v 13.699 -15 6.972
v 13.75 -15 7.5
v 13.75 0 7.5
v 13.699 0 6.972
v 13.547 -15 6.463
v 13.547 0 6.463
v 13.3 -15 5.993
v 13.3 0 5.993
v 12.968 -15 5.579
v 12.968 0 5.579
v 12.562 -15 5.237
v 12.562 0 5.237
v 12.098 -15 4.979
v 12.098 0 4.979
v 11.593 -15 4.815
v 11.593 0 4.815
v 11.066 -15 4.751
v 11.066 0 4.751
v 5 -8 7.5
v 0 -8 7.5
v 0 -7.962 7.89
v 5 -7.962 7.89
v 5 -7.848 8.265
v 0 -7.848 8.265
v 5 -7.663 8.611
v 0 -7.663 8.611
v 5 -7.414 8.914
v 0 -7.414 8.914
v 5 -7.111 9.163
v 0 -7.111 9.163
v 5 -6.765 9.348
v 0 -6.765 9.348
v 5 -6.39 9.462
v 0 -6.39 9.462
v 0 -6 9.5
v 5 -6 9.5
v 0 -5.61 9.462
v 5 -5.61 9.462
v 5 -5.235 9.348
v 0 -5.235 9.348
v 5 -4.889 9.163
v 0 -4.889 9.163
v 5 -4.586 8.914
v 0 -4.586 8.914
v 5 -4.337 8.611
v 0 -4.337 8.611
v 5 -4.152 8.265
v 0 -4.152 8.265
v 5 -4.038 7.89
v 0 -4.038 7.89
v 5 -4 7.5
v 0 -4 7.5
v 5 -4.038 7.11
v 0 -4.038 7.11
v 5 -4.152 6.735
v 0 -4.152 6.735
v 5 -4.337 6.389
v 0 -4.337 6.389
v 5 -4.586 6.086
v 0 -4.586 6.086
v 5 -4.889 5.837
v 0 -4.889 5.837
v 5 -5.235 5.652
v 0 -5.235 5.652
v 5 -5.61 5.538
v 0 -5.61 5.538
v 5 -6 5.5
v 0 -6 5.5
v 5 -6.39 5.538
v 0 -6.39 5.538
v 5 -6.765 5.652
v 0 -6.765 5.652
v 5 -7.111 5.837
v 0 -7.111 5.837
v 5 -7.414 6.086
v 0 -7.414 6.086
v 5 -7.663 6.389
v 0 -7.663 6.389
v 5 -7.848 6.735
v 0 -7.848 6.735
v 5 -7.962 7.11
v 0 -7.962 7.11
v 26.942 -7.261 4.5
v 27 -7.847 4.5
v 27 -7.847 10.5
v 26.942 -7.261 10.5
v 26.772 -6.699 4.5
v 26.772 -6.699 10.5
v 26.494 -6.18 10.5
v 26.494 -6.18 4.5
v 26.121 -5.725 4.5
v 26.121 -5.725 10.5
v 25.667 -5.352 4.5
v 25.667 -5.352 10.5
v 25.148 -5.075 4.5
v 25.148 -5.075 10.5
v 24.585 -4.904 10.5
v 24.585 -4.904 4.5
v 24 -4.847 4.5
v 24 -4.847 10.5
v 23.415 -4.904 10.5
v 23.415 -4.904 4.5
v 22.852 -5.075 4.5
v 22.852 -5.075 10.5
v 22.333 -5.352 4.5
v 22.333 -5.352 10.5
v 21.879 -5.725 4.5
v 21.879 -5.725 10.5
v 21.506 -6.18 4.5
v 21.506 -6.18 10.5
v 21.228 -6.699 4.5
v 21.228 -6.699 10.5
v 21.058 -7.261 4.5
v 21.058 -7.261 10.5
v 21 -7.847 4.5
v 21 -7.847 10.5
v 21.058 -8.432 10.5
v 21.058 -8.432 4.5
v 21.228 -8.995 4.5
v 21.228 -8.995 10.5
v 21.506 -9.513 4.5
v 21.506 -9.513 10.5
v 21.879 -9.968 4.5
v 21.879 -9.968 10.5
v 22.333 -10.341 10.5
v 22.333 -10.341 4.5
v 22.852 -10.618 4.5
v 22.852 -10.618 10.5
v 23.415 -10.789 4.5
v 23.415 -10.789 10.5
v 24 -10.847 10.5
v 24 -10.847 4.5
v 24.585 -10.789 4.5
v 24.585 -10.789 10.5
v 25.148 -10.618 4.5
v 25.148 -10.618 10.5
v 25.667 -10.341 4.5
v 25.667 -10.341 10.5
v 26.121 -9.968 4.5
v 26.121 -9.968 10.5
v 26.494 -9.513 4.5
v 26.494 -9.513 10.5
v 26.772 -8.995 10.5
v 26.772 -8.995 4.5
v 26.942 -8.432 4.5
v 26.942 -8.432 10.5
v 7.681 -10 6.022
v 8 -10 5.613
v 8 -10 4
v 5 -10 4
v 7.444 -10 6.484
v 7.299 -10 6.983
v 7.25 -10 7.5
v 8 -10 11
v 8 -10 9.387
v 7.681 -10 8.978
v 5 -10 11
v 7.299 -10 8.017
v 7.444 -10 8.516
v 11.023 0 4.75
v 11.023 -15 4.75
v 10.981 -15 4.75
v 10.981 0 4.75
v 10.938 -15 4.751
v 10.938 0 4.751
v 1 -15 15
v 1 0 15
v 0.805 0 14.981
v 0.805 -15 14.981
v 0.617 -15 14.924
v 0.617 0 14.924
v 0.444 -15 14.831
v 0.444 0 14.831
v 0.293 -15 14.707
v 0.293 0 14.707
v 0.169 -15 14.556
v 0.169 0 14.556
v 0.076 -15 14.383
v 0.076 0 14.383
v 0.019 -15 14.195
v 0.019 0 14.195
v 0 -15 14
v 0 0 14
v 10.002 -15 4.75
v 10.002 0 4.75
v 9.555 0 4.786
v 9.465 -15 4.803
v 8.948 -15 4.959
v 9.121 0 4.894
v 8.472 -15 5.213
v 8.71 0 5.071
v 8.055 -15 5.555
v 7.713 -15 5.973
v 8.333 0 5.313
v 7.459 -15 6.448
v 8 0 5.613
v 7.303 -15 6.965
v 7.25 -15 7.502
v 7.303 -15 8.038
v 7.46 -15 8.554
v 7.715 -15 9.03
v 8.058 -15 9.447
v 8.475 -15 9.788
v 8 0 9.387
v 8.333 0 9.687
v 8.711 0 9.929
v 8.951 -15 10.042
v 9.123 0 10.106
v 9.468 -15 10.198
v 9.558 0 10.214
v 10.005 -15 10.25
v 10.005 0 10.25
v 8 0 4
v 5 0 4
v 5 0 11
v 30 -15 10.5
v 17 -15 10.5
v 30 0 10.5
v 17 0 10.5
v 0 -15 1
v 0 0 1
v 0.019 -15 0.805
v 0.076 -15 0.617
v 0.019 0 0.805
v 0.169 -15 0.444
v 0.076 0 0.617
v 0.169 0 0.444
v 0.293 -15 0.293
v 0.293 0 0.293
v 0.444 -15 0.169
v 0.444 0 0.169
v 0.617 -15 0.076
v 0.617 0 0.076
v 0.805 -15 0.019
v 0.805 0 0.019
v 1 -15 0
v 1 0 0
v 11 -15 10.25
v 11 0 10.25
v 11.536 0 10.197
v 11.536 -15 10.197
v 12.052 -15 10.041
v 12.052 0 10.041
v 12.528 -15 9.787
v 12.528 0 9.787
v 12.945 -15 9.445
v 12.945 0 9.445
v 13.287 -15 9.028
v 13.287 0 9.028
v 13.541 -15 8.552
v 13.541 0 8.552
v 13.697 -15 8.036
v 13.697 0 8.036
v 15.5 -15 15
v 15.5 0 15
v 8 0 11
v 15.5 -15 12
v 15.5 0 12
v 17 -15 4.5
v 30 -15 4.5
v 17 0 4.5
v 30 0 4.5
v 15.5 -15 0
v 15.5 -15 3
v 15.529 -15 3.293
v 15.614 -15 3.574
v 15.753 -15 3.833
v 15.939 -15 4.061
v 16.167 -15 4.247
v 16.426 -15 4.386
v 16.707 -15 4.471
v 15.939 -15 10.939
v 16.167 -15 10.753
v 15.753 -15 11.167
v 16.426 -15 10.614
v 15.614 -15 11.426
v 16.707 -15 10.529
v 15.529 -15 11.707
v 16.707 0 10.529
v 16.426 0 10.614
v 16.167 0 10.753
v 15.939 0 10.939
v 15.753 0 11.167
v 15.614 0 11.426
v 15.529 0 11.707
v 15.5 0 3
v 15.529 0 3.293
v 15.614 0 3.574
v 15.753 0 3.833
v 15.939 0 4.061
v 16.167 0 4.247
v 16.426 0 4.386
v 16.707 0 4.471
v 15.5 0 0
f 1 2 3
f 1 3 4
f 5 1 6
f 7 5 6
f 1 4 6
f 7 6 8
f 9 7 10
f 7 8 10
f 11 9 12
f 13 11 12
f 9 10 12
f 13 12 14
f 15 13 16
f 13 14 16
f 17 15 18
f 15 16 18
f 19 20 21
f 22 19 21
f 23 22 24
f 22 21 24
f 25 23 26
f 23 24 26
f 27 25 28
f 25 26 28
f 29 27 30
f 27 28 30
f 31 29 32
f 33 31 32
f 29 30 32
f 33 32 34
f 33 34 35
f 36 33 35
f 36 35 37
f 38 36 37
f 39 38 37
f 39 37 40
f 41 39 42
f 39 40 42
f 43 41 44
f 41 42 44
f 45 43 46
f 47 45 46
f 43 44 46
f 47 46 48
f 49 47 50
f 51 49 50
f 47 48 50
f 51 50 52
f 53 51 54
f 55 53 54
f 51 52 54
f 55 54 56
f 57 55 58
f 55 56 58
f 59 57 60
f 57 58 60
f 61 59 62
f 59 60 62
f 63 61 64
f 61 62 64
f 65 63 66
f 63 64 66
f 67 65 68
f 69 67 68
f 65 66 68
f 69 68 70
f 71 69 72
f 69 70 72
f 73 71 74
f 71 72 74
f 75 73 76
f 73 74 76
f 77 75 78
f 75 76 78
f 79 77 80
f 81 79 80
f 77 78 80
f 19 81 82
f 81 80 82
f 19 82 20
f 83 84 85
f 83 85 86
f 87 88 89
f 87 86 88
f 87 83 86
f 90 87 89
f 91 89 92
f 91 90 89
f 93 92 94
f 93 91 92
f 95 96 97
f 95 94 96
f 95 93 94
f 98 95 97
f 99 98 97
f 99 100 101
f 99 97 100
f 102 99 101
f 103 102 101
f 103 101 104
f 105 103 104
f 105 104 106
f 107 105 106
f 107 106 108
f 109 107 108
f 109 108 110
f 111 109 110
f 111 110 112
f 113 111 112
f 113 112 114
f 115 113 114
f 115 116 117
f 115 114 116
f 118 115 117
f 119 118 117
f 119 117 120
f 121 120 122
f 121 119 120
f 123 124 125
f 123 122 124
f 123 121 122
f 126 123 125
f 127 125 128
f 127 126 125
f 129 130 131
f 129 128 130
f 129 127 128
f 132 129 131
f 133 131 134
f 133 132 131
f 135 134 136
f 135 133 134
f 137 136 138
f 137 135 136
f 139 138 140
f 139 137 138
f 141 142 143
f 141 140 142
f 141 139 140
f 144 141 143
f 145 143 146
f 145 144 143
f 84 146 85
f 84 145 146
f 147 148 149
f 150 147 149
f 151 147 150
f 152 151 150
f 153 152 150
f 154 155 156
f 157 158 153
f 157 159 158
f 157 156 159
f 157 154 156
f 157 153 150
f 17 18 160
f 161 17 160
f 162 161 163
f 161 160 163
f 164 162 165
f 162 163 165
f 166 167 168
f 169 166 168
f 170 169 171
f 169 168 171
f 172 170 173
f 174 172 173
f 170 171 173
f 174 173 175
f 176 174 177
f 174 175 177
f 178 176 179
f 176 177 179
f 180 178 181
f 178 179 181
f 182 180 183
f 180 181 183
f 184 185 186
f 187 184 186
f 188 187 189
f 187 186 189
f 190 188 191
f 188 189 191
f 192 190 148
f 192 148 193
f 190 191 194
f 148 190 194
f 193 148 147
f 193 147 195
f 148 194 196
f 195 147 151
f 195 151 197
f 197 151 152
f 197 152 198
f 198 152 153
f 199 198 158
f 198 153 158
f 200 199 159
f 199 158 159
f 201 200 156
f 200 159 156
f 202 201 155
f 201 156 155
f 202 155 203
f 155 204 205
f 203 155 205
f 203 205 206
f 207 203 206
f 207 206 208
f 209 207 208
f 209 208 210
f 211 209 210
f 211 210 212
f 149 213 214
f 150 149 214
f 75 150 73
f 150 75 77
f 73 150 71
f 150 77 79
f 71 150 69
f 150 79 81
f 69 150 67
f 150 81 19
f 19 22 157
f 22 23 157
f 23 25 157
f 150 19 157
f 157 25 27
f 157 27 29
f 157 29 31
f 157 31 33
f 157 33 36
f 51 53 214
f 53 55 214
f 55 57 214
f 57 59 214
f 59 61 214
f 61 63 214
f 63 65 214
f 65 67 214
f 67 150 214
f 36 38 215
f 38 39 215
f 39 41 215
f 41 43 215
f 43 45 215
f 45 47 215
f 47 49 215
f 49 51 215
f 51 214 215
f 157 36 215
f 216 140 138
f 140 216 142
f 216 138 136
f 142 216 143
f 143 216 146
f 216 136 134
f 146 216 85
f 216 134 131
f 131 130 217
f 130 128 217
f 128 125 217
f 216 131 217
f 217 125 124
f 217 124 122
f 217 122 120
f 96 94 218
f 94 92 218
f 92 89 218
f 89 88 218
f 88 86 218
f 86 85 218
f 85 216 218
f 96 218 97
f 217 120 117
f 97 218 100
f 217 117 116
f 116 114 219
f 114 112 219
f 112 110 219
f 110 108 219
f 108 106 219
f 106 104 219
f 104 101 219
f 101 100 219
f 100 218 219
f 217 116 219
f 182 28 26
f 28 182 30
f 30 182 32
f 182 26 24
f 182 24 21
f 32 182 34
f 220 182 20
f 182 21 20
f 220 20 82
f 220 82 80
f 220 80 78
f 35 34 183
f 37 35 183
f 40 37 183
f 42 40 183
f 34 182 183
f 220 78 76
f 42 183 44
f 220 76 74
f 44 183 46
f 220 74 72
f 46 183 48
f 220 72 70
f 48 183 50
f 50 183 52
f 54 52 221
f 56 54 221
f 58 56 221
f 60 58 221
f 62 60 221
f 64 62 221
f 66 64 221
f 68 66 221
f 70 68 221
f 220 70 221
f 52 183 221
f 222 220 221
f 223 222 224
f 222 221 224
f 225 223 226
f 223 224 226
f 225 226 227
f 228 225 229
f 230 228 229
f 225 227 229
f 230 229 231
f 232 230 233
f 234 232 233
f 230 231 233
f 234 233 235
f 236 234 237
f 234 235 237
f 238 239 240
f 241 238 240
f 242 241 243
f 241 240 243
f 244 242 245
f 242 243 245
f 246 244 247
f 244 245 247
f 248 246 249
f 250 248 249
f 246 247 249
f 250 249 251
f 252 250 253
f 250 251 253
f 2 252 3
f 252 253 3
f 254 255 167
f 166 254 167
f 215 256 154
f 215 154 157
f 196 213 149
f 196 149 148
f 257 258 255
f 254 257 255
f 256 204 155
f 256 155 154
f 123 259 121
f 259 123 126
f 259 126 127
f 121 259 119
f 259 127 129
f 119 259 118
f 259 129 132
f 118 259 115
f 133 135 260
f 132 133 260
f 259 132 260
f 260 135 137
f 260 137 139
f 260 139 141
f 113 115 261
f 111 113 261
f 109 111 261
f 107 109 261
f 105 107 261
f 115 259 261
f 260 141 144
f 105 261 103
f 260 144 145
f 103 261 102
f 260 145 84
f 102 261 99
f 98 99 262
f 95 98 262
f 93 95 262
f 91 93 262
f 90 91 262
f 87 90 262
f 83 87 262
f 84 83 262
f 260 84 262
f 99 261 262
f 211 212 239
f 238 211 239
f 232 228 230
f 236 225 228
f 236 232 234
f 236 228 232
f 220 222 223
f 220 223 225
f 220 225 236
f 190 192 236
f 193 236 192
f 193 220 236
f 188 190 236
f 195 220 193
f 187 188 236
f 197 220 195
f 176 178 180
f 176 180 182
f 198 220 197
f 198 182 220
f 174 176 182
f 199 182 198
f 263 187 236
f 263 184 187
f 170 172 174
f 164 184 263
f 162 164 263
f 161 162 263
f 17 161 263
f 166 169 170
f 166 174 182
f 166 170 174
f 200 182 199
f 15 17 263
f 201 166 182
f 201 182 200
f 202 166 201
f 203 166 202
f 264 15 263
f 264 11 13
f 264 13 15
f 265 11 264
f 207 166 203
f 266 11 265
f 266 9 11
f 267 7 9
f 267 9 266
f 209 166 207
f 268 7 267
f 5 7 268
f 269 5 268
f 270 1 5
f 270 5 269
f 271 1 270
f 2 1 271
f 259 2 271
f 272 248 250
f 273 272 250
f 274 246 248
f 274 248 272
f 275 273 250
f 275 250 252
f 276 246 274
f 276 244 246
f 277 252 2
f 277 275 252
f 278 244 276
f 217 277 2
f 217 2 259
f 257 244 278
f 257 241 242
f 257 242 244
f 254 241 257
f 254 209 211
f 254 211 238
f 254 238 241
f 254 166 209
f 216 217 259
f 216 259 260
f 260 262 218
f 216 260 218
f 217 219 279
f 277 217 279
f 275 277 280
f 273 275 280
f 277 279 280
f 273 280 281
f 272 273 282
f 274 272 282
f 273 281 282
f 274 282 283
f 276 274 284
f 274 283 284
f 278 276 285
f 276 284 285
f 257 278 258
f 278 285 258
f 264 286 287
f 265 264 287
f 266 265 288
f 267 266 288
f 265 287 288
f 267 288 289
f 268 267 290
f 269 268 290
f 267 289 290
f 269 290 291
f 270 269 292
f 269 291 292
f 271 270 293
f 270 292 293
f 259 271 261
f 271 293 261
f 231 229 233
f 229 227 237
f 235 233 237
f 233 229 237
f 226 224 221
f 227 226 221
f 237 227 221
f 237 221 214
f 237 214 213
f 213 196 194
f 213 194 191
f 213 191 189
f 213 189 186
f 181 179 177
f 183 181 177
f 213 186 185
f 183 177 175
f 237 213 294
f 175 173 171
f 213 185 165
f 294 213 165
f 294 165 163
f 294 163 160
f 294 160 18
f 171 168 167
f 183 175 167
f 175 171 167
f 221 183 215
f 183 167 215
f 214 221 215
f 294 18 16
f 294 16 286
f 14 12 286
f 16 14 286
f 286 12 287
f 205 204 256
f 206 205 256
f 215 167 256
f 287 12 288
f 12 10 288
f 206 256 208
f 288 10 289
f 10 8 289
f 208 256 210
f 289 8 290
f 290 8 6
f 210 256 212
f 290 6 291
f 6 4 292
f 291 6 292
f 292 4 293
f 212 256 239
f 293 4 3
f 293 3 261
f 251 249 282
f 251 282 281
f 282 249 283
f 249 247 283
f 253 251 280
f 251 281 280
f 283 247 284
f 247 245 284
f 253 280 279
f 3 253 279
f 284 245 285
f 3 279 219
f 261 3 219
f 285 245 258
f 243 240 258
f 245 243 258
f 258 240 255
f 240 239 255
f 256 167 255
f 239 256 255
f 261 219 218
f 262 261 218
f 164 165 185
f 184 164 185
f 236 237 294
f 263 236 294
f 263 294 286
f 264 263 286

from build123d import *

# Parameters (mm, degrees)
F1_DEPTH = 15
F2_R     = 3
F3_DEPTH = 15.001
F4_W     = 3
F4_H     = 7
F5_DEPTH = 10
F6_R     = 2
F7_DEPTH = 5


with BuildPart() as f1:
    # F0 (on Front) → F1 (new body)
    with BuildSketch(Plane.XZ):
        with BuildLine():
            Line((15.5, 15), (1, 15))
            ThreePointArc((1, 15), (0.292893, 14.707107), (0, 14))
            Line((0, 14), (0, 1))
            ThreePointArc((0, 1), (0.292893, 0.292893), (1, 0))
            Line((1, 0), (15.5, 0))
            Line((15.5, 0), (15.5, 3))
            ThreePointArc((15.5, 3), (15.93934, 4.06066), (17, 4.5))
            Line((17, 4.5), (30, 4.5))
            Line((30, 4.5), (30, 10.5))
            Line((30, 10.5), (17, 10.5))
            ThreePointArc((17, 10.5), (15.93934, 10.93934), (15.5, 12))
            Line((15.5, 12), (15.5, 15))
        make_face()
        with BuildLine():
            ThreePointArc((10.001502, 4.75), (7.25, 7.501527), (10.004555, 10.249996))
            Line((10.004555, 10.249996), (10.99999, 10.25))
            ThreePointArc((10.99999, 10.25), (12.94454, 9.444547), (13.75, 7.5))
            ThreePointArc((13.75, 7.5), (12.967788, 5.578982), (11.066137, 4.750795))
            ThreePointArc((11.066137, 4.750795), (11.002054, 4.750001), (10.937969, 4.7507))
            Line((10.937969, 4.7507), (10.001502, 4.75))
        make_face(mode=Mode.SUBTRACT)
    extrude(amount=F1_DEPTH)

    # F2 (on Top) → F3 (cut, through all)
    with BuildSketch(Plane.XY):
        with Locations((24, -7.846627)):
            Circle(F2_R)
    extrude(amount=F3_DEPTH, mode=Mode.SUBTRACT)

    # F4 (on face) → F5 (cut)
    with BuildSketch(Plane(origin=(0, 0, 0), x_dir=(-1, 0, 0), z_dir=(0, 1, 0))):
        with Locations((-6.5, 7.5)):
            Rectangle(F4_W, F4_H)
    extrude(amount=-F5_DEPTH, mode=Mode.SUBTRACT)

    # F6 (on face) → F7 (cut)
    with BuildSketch(Plane(origin=(0, 0, 0), x_dir=(0, -1, 0), z_dir=(-1, 0, 0))):
        with Locations((6, 7.5)):
            Circle(F6_R)
    extrude(amount=-F7_DEPTH, mode=Mode.SUBTRACT)


solid = f1.part
